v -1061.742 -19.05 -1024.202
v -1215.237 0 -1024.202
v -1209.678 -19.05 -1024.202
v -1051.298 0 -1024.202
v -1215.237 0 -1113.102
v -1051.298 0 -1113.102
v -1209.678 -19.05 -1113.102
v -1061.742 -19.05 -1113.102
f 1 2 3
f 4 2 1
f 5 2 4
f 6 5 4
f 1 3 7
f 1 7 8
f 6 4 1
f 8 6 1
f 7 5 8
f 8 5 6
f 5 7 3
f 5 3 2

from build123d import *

# Parameters (mm, degrees)
F0_W     = 163.938712
F0_H     = 88.9
F1_DEPTH = 19.05
F3_DEPTH = 88.901
F4_DEPTH = 88.901


with BuildPart() as f1:
    # F0 (on Front) → F1 (new body)
    with BuildSketch(Plane.XZ):
        with Locations((-1133.26766, -1068.65232)):
            Rectangle(F0_W, F0_H)
    extrude(amount=F1_DEPTH)

    # F2 (on face) → F3 (cut, through all)
    with BuildSketch(Plane.XY.offset(-1024.20232)):
        Polygon((-1209.678422, -19.05), (-1215.237016, 0), (-1215.237016, -19.05), align=None)
    extrude(amount=-F3_DEPTH, mode=Mode.SUBTRACT)

    # F2 (on face) → F4 (cut, through all)
    with BuildSketch(Plane.XY.offset(-1024.20232)):
        Polygon((-1051.298304, -19.05), (-1051.298304, 0), (-1061.742284, -19.05), align=None)
    extrude(amount=-F4_DEPTH, mode=Mode.SUBTRACT)


solid = f1.part
